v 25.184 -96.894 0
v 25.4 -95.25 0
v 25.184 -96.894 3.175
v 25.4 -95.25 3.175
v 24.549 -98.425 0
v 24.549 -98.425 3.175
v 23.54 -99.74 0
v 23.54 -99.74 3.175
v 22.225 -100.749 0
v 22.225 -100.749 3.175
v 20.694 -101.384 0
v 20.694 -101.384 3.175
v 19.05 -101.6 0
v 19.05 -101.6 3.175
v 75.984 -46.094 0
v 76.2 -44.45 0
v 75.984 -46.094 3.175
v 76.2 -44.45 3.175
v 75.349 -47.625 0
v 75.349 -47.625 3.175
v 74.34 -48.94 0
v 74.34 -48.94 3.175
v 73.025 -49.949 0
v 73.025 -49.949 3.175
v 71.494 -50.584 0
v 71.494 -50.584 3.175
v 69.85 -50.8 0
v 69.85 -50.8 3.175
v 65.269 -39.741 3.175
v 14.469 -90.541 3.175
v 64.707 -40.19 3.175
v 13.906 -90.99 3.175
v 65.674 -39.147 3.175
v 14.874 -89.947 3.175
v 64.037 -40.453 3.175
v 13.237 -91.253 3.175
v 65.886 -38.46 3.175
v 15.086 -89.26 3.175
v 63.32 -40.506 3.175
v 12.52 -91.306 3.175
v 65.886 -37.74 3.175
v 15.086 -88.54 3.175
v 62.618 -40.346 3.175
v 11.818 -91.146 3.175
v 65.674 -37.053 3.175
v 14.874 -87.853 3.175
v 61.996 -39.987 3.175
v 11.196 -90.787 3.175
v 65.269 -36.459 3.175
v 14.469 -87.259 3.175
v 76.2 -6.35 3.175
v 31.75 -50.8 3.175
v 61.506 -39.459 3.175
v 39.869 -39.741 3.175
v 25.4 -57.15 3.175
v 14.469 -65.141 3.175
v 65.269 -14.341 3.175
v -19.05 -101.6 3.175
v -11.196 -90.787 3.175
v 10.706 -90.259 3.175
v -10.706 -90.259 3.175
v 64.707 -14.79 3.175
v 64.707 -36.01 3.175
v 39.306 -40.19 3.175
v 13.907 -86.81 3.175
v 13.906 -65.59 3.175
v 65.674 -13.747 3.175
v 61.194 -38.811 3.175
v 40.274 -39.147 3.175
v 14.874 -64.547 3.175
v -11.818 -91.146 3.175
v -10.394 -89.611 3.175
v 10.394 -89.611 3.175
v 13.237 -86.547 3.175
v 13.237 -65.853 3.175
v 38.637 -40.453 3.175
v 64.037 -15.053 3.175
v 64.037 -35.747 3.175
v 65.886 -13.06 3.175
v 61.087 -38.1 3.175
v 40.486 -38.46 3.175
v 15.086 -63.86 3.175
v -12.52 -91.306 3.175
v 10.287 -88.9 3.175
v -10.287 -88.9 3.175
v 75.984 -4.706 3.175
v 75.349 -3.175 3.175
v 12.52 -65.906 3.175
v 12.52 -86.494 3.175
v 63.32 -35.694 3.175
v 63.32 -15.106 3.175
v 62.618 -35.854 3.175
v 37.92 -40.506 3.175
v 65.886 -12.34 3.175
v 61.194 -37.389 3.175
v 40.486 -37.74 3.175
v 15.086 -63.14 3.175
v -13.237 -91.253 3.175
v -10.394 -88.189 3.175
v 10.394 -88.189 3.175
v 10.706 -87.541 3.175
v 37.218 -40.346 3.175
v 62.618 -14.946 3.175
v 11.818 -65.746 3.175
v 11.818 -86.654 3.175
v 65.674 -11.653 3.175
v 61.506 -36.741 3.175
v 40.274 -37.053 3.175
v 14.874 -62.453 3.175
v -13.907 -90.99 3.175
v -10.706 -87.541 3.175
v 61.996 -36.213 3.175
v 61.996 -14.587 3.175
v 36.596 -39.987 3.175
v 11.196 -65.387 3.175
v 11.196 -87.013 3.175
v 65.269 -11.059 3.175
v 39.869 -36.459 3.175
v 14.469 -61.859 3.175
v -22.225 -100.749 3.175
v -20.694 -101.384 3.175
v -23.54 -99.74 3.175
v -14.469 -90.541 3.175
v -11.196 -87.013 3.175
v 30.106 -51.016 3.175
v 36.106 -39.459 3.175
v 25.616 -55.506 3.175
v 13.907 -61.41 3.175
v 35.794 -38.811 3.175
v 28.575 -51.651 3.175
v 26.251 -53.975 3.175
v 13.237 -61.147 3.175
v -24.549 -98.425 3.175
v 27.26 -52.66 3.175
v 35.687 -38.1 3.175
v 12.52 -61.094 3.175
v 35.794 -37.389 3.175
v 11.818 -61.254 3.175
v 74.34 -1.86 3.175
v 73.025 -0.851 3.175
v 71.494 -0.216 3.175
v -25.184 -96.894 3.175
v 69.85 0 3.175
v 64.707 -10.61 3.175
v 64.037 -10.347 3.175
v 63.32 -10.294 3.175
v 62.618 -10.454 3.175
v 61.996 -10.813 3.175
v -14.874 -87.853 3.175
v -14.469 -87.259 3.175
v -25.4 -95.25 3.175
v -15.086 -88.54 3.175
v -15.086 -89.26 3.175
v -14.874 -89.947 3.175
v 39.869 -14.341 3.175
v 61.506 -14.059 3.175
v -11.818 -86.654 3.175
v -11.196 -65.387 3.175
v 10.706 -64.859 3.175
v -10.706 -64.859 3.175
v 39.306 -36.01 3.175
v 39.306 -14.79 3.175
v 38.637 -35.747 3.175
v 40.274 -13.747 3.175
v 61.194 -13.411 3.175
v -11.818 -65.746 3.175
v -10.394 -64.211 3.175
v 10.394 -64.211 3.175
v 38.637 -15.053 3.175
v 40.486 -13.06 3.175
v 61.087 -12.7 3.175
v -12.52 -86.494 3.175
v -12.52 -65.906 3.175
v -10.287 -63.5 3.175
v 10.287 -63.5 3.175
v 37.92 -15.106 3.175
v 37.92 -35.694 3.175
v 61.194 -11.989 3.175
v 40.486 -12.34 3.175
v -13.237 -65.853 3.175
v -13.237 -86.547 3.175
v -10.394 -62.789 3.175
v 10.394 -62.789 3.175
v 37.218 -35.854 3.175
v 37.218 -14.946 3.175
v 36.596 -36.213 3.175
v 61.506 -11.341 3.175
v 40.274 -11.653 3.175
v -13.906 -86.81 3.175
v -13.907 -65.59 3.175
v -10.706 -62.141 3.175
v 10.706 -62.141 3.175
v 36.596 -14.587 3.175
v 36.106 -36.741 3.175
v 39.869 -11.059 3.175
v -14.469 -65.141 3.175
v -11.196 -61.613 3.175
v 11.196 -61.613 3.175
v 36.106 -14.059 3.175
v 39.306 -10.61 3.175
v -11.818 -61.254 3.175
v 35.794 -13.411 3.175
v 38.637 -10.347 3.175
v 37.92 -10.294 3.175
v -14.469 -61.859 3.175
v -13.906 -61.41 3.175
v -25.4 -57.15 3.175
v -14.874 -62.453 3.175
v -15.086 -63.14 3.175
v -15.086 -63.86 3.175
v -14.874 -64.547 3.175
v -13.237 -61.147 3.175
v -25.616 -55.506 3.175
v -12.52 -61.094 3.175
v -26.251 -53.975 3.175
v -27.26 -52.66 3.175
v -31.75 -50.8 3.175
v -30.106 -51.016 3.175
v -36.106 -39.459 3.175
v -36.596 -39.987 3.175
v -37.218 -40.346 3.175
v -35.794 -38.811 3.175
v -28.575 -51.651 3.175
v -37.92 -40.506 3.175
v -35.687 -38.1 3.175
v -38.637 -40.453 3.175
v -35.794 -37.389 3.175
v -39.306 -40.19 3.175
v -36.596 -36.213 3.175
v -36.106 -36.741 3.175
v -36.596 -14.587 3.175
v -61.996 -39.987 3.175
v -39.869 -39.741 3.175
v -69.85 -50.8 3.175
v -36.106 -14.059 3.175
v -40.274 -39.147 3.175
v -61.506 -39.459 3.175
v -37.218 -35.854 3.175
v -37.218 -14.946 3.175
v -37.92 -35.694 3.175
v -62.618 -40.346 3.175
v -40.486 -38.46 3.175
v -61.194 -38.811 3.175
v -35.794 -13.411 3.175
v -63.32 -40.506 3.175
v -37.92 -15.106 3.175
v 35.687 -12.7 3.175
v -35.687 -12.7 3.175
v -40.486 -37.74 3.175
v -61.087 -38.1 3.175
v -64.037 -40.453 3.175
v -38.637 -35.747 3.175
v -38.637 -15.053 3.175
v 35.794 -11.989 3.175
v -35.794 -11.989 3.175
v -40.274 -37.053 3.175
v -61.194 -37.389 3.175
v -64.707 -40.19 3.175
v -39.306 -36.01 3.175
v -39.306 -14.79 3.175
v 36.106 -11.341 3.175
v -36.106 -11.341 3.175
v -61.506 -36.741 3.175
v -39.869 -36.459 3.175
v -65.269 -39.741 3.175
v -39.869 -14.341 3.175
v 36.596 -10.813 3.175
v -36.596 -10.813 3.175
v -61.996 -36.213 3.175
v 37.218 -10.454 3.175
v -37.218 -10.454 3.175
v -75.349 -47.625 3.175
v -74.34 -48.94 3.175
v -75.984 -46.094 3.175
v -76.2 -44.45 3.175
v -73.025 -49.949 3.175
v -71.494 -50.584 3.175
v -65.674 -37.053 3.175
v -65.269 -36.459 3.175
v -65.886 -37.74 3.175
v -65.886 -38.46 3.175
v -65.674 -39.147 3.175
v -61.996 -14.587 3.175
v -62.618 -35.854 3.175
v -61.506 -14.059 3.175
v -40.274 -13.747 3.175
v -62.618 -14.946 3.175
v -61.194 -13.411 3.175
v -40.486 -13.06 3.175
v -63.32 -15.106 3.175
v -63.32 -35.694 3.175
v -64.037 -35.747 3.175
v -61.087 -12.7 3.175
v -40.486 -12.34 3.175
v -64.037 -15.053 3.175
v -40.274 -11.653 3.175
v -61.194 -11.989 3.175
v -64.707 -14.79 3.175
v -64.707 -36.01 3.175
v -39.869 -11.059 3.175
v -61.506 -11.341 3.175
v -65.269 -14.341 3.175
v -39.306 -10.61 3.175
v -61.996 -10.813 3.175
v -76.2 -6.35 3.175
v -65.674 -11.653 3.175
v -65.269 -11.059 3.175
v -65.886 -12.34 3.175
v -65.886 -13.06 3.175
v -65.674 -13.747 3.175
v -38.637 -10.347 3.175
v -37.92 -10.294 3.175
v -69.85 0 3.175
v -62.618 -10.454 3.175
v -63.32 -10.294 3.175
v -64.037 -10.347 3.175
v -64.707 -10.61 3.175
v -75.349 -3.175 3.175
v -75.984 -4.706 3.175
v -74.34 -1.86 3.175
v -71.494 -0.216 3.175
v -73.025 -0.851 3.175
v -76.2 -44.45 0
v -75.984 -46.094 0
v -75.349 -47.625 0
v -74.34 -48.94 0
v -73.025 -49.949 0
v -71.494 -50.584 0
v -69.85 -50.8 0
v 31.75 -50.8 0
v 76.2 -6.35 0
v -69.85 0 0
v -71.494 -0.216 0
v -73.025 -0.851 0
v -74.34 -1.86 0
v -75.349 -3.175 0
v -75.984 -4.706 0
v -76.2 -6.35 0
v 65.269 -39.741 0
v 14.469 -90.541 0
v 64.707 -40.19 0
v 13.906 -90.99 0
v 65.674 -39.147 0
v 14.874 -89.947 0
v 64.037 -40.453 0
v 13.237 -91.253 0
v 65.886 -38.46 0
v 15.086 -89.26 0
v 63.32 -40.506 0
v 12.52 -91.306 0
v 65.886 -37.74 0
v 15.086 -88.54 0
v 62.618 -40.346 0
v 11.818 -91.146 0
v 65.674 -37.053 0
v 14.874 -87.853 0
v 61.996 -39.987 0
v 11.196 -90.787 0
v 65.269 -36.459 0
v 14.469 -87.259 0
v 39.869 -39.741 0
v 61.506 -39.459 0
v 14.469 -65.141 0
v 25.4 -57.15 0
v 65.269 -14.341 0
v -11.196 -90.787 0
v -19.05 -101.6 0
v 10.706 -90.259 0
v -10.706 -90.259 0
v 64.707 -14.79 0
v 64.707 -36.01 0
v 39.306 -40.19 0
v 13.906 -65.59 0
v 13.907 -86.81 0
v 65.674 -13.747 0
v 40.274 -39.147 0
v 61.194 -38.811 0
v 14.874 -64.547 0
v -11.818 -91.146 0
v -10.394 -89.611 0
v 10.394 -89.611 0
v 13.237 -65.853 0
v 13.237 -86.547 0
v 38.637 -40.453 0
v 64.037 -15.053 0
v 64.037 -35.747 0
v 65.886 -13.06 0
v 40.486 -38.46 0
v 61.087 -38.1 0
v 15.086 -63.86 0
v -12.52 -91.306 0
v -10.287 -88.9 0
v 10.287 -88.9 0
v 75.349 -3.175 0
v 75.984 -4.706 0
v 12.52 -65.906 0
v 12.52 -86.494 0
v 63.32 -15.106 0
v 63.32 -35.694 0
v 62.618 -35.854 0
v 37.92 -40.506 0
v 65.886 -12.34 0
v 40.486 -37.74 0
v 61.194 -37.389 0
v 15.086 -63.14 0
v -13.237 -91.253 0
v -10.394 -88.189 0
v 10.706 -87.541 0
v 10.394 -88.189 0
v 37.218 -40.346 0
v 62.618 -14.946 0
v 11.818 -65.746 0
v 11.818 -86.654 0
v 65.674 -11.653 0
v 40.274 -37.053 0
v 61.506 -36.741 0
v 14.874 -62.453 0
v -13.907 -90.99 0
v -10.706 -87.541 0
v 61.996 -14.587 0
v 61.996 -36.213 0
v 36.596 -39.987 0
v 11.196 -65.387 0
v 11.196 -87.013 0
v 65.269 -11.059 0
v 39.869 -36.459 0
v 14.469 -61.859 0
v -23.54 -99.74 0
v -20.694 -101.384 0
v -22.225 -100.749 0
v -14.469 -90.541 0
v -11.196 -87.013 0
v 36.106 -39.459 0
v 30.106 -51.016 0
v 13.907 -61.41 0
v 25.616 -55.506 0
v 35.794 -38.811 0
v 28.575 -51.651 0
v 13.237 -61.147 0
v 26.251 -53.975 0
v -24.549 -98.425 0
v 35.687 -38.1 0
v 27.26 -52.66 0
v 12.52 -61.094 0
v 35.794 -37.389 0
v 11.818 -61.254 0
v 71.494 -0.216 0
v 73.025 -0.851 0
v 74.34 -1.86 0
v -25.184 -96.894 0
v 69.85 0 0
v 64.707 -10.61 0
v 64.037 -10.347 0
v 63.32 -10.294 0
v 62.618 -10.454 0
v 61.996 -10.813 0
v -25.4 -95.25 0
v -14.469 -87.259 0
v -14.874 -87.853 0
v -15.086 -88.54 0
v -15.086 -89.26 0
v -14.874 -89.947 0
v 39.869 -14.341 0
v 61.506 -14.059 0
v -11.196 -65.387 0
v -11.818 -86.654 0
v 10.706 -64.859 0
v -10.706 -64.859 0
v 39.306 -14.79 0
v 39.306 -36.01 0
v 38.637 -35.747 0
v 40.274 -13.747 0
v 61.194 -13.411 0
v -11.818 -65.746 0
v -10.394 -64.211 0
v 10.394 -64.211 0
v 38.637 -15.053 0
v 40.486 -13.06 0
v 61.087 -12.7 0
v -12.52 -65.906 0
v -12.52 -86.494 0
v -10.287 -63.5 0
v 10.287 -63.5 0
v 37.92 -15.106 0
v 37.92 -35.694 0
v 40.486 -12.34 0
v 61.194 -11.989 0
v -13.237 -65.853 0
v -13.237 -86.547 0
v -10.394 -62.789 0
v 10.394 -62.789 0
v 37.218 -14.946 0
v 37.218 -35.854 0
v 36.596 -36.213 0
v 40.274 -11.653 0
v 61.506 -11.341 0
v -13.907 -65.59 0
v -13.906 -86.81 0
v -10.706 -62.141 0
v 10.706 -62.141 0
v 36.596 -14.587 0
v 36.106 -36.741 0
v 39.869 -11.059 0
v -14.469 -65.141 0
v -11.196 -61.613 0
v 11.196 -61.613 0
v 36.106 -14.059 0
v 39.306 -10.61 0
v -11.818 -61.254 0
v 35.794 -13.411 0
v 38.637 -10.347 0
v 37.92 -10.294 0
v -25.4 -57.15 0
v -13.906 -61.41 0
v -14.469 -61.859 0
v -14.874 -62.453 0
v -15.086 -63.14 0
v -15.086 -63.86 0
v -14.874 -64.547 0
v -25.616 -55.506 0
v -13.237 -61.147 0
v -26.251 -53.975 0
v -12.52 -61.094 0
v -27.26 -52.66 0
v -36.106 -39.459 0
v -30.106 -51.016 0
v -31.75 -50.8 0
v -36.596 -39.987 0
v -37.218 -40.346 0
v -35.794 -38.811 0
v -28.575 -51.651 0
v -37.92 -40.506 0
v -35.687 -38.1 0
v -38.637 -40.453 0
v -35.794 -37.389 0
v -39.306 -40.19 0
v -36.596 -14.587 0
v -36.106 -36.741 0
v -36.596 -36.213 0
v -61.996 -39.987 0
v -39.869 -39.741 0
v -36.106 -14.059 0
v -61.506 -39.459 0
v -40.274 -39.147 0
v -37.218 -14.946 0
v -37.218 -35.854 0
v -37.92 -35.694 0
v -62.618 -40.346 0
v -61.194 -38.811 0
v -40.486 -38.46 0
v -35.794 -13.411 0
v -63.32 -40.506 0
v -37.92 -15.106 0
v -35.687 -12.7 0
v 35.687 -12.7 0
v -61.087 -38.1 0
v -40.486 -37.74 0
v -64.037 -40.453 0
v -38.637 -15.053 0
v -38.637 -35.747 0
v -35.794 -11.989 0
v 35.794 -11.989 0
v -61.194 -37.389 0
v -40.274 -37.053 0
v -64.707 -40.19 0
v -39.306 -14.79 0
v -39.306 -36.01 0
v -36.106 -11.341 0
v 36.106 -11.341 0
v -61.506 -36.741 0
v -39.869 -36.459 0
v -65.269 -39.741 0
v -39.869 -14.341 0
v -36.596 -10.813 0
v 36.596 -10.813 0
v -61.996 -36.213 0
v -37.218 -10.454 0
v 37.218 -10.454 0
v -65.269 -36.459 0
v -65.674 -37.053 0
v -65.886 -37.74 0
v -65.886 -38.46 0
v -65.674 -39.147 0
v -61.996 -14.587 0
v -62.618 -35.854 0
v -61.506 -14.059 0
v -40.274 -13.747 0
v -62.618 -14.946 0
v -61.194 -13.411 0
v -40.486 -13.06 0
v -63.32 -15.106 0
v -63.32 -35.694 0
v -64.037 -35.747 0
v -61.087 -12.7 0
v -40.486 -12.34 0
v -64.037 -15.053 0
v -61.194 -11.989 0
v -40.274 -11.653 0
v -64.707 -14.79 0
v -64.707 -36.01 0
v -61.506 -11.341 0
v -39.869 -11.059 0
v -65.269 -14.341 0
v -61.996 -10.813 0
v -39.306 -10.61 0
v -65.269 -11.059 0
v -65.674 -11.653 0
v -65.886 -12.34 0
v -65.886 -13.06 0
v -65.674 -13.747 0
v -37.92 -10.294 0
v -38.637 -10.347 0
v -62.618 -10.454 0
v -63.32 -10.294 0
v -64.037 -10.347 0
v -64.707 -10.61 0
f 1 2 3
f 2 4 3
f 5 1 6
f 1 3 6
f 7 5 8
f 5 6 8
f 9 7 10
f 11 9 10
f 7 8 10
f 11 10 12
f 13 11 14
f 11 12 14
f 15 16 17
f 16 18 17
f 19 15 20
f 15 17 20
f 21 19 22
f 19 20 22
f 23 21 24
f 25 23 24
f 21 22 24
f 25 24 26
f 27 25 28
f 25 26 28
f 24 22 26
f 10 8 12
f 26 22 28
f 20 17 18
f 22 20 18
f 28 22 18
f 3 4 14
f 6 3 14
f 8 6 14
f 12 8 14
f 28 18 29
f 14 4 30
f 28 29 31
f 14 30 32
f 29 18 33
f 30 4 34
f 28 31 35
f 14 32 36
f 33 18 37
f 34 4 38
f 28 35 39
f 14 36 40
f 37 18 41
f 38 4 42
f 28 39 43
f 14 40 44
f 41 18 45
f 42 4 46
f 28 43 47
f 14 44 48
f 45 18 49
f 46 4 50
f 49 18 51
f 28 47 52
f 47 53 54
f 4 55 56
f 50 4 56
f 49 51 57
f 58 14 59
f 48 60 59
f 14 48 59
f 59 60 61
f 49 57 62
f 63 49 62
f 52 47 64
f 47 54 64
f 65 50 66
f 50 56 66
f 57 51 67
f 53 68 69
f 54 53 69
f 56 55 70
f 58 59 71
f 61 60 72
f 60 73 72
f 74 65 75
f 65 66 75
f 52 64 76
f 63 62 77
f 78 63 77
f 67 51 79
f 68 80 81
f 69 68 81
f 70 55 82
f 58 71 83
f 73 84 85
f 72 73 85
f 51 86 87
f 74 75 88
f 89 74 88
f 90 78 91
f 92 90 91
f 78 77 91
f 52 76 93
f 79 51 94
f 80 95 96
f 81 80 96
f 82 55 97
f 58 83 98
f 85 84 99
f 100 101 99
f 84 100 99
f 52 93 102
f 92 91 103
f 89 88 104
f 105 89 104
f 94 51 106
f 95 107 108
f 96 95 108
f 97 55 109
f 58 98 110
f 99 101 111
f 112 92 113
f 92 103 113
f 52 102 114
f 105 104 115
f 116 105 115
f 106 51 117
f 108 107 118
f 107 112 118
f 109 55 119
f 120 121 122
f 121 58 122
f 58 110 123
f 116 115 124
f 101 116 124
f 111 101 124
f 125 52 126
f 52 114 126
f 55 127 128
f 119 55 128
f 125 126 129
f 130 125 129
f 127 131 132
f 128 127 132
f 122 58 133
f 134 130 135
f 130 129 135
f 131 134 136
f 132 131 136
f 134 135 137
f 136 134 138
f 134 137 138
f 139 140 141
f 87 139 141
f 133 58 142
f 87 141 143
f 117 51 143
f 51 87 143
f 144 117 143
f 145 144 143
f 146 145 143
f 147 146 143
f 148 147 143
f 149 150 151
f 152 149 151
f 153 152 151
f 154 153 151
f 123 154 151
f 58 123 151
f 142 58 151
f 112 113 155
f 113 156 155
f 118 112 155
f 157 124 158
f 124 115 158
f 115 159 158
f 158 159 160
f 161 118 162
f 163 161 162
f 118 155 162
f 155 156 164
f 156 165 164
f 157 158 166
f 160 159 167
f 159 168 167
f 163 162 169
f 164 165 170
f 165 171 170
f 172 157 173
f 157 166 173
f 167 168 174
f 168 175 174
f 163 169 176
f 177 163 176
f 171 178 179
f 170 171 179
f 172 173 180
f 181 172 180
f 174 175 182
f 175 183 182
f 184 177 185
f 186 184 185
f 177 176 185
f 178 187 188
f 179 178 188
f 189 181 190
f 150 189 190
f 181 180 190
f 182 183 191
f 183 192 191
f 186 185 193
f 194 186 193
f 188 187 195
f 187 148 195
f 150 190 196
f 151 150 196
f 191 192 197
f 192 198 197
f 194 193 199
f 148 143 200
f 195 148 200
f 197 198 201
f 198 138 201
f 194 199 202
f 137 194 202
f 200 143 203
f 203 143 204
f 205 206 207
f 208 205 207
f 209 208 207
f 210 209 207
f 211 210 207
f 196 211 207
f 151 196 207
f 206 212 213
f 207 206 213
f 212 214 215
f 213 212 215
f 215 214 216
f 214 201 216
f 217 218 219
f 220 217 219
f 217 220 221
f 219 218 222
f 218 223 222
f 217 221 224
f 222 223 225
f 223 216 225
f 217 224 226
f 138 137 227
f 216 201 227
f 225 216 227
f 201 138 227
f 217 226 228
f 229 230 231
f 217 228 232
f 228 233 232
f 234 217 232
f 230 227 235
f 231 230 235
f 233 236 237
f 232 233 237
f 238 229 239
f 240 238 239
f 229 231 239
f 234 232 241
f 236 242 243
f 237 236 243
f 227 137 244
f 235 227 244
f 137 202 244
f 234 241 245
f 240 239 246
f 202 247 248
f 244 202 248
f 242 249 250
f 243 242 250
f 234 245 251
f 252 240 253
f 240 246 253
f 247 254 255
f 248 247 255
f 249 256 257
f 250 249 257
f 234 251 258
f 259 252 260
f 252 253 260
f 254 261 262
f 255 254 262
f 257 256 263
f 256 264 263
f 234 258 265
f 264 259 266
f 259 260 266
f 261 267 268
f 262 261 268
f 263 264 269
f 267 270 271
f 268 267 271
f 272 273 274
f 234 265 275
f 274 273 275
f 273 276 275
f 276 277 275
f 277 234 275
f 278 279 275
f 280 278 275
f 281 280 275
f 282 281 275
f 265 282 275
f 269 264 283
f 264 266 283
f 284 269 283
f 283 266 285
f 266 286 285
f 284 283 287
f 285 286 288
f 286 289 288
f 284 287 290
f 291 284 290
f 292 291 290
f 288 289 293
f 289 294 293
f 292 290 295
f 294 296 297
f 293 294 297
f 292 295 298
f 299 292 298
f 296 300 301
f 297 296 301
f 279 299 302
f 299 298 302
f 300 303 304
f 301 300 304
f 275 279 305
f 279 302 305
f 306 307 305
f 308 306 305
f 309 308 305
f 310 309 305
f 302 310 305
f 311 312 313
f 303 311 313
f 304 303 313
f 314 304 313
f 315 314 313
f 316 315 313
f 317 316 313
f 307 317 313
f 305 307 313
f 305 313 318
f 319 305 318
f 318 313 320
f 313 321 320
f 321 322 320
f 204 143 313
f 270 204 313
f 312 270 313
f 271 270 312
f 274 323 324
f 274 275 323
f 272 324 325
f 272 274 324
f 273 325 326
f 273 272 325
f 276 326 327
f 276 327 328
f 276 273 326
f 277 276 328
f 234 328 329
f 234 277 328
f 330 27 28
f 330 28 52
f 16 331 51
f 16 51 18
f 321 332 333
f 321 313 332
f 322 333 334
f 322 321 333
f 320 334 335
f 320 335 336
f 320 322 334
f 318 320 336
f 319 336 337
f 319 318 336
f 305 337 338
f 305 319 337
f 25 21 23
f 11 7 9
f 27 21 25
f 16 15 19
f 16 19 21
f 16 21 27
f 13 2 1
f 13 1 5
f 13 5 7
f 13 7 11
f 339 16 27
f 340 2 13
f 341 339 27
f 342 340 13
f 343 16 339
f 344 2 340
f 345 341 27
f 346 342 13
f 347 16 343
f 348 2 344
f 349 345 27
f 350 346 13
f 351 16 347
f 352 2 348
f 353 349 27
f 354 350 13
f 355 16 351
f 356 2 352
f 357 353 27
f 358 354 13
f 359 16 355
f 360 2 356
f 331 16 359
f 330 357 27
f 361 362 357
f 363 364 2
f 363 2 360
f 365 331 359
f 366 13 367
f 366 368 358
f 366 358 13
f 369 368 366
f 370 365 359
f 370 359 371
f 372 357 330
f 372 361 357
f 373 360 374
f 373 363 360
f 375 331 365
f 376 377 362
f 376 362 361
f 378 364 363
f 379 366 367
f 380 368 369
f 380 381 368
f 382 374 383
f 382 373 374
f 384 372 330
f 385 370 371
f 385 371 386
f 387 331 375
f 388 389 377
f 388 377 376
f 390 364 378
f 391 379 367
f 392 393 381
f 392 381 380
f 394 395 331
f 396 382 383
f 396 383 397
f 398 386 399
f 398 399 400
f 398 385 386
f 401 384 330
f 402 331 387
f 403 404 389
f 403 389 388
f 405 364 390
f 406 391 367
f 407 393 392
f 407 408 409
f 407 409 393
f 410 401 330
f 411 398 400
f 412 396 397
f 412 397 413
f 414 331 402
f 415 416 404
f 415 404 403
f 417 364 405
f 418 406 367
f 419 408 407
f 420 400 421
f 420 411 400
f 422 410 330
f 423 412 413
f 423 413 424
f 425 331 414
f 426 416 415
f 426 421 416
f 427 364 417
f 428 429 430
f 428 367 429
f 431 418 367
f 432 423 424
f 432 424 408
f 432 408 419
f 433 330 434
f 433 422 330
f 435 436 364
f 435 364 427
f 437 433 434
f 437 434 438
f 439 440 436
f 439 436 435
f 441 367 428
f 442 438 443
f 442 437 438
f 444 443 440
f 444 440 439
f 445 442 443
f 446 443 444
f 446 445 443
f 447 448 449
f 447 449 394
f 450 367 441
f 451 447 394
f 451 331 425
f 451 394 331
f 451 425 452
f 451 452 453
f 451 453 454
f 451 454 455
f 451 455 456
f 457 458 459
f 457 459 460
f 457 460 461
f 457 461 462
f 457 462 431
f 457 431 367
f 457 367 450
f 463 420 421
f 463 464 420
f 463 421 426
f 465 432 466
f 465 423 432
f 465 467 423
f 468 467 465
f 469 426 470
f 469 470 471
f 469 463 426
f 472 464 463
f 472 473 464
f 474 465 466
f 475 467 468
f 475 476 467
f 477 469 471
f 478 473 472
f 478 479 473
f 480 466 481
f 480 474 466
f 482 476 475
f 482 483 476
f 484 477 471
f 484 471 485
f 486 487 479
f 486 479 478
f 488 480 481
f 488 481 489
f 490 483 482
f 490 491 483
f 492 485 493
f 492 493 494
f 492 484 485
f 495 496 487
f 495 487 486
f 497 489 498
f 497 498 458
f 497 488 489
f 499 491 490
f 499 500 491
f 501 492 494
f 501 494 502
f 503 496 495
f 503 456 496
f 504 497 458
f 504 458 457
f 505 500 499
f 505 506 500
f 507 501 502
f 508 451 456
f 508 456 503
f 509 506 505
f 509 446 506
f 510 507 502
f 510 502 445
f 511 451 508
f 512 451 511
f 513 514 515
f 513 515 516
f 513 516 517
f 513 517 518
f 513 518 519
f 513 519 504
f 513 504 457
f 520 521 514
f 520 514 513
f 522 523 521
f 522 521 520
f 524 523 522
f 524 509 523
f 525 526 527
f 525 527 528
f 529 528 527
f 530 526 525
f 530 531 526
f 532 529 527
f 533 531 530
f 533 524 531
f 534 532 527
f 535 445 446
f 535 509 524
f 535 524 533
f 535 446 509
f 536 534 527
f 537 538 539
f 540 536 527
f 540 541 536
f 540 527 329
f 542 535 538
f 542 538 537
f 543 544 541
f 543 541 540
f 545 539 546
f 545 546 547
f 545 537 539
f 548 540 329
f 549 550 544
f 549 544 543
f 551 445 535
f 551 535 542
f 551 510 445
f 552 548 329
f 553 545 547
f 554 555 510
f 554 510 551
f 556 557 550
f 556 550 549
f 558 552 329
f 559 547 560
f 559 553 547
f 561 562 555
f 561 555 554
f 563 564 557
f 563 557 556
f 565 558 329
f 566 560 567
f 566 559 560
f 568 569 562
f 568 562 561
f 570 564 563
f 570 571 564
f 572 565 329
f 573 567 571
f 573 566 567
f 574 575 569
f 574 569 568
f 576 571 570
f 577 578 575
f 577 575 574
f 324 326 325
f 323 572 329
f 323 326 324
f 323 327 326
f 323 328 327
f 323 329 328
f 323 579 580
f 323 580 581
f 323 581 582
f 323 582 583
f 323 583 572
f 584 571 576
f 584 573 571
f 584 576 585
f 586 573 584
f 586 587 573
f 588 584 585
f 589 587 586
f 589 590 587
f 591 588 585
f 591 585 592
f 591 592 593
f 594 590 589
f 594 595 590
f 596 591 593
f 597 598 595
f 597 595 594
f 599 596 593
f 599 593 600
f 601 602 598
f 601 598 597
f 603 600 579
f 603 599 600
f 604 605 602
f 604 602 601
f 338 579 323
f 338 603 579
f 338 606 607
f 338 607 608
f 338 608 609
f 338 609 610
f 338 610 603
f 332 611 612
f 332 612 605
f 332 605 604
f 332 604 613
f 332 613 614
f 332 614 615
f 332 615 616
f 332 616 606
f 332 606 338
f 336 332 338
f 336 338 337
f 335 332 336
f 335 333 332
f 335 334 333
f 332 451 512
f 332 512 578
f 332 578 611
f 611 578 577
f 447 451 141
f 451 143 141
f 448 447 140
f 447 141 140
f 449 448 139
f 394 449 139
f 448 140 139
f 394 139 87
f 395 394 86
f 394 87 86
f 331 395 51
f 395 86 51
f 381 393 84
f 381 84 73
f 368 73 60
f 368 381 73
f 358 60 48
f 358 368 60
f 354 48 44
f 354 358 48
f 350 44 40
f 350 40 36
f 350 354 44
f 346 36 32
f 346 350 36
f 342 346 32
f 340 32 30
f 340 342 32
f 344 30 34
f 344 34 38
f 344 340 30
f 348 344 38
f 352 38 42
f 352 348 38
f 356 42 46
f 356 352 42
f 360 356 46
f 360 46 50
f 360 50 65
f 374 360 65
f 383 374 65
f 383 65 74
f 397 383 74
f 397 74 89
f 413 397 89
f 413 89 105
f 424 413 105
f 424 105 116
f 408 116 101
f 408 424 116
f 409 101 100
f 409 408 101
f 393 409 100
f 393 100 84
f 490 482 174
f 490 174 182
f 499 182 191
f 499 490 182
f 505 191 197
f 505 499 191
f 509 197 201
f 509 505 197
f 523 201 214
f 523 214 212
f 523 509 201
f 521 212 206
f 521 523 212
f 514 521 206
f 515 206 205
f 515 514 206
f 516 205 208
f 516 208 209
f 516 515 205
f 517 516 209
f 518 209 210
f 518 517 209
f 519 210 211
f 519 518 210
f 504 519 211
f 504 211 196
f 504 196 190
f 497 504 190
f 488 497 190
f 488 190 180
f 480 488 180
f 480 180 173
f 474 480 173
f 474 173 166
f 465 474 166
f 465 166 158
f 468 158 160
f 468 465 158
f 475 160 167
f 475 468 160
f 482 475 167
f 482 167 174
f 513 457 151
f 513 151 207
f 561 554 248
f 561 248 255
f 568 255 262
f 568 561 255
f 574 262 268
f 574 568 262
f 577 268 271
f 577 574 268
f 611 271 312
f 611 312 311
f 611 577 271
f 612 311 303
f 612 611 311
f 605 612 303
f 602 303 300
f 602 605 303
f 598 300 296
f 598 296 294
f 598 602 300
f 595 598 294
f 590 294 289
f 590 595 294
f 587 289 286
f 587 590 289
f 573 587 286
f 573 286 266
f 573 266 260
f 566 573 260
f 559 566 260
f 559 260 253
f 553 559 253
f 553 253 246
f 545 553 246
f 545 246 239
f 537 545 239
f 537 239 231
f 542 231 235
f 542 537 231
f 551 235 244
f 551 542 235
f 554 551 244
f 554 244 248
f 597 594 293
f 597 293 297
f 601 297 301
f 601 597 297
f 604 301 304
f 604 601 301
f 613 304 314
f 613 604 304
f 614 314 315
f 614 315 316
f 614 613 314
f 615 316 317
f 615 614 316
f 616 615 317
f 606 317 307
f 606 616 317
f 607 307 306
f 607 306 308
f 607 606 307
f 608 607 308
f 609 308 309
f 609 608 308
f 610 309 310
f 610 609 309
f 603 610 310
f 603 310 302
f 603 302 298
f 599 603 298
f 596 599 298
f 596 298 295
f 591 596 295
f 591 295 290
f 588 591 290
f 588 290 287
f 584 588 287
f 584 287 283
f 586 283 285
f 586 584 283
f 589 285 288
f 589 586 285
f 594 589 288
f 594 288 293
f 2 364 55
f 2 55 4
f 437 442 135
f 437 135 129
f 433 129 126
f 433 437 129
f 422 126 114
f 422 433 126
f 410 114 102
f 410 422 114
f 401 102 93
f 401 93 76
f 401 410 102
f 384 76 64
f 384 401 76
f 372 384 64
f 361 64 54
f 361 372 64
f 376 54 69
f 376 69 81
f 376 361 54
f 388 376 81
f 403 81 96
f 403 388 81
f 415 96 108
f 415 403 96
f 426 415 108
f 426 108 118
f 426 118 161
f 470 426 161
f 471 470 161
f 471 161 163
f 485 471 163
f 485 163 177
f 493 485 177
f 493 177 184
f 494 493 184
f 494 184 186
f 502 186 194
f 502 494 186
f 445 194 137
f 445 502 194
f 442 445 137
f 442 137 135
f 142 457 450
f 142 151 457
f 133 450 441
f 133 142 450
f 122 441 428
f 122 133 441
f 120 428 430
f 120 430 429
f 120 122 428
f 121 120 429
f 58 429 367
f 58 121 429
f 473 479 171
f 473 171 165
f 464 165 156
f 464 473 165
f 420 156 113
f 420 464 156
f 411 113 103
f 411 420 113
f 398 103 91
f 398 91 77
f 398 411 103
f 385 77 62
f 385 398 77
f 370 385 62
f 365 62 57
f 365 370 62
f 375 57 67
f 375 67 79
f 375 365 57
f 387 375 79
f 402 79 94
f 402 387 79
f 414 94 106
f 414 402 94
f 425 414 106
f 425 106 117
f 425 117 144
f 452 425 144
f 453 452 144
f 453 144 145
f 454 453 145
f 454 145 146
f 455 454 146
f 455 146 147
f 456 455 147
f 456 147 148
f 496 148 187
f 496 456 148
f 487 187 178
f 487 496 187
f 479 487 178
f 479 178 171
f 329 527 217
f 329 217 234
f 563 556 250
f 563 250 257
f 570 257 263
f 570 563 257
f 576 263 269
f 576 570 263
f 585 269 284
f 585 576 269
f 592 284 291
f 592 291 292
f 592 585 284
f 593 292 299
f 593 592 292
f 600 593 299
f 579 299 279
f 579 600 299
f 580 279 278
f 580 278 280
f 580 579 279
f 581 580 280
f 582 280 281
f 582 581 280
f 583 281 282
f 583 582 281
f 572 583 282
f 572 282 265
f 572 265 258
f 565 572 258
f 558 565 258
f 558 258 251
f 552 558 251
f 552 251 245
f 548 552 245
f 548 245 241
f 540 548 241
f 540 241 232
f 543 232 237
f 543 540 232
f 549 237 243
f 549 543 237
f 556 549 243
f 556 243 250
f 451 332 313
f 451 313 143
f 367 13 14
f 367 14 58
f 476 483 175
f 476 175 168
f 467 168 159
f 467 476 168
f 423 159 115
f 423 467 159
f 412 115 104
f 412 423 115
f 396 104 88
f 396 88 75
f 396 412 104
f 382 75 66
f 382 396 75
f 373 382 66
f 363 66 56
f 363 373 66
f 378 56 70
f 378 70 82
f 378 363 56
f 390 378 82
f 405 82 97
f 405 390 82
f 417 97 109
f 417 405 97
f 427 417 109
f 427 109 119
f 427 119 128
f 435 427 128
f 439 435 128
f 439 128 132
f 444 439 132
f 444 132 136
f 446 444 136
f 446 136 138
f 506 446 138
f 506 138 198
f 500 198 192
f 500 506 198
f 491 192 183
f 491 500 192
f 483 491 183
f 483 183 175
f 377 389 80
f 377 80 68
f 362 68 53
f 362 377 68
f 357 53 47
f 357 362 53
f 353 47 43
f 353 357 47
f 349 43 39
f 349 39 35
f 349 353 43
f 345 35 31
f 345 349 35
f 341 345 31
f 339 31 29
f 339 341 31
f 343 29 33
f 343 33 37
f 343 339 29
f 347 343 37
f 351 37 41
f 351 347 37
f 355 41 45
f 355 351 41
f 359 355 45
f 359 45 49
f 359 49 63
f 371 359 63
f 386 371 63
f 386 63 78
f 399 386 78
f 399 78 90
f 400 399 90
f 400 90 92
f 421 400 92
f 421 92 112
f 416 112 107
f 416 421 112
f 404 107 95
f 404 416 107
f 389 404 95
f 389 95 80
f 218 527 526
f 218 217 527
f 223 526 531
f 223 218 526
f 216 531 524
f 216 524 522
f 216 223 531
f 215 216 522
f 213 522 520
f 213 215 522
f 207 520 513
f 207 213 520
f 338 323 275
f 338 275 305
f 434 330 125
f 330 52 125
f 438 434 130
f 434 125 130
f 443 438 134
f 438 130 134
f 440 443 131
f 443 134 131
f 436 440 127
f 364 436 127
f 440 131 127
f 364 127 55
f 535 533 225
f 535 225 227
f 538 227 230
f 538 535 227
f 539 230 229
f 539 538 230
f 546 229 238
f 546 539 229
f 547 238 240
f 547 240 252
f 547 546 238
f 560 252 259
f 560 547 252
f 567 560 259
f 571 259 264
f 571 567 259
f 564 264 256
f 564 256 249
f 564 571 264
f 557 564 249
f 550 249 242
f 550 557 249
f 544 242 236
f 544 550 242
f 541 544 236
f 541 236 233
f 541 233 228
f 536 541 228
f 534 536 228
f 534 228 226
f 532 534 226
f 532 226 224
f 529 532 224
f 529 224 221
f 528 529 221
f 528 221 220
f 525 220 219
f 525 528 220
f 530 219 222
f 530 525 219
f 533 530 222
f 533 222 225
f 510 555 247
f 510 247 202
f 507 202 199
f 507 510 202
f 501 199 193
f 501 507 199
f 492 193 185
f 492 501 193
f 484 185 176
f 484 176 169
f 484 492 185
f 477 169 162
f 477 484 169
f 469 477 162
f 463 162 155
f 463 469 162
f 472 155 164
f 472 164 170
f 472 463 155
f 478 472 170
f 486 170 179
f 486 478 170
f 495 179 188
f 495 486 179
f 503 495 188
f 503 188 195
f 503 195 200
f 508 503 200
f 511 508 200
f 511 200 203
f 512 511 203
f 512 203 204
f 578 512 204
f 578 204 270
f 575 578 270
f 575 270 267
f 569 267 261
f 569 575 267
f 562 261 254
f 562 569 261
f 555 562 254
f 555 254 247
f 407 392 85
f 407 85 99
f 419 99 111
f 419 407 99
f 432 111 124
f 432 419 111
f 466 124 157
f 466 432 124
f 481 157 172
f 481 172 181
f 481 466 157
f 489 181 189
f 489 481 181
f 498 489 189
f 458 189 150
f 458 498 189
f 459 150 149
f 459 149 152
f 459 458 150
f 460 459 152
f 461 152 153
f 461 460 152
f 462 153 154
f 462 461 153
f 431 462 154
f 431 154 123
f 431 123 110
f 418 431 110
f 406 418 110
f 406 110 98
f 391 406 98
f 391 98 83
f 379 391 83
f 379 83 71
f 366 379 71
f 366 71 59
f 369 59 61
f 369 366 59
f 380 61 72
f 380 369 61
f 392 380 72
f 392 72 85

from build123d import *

# Parameters (mm, degrees)
SKETCH1_R           = 2.413
BOSS_EXTRUDE1_DEPTH = 3.175
FILLET1_R           = 6.35


with BuildPart() as part:
    # Sketch1 → Boss-Extrude1 (new body)
    with BuildSketch(Plane.XY):
        Polygon((-76.2, 0), (76.2, 0), (76.2, -50.8), (25.4, -50.8), (25.4, -101.6), (-25.4, -101.6), (-25.4, -50.8), (-76.2, -50.8), align=None)
        with Locations((-63.5, -12.7)):
            Circle(SKETCH1_R, mode=Mode.SUBTRACT)
        with Locations((-63.5, -38.1)):
            Circle(SKETCH1_R, mode=Mode.SUBTRACT)
        with Locations((-38.1, -12.7)):
            Circle(SKETCH1_R, mode=Mode.SUBTRACT)
        with Locations((-38.1, -38.1)):
            Circle(SKETCH1_R, mode=Mode.SUBTRACT)
        with Locations((-12.7, -88.9)):
            Circle(SKETCH1_R, mode=Mode.SUBTRACT)
        with Locations((-12.7, -63.5)):
            Circle(SKETCH1_R, mode=Mode.SUBTRACT)
        with Locations(Location((12.7, -88.9, 0), (0, 0, 180))):
            Circle(SKETCH1_R, mode=Mode.SUBTRACT)
        with Locations(Location((12.7, -63.5, 0), (0, 0, 180))):
            Circle(SKETCH1_R, mode=Mode.SUBTRACT)
        with Locations(Location((63.5, -38.1, 0), (0, 0, 180))):
            Circle(SKETCH1_R, mode=Mode.SUBTRACT)
        with Locations(Location((38.1, -38.1, 0), (0, 0, 180))):
            Circle(SKETCH1_R, mode=Mode.SUBTRACT)
        with Locations(Location((38.1, -12.7, 0), (0, 0, 180))):
            Circle(SKETCH1_R, mode=Mode.SUBTRACT)
        with Locations(Location((63.5, -12.7, 0), (0, 0, 180))):
            Circle(SKETCH1_R, mode=Mode.SUBTRACT)
    extrude(amount=BOSS_EXTRUDE1_DEPTH)

    # Fillet1
    fillet1_edges = [part.edges().sort_by_distance(p)[0] for p in [
        (25.4, -101.6, 1.5875),
        (-25.4, -101.6, 1.5875),
        (-25.4, -50.8, 1.5875),
        (-76.2, -50.8, 1.5875),
        (-76.2, 0, 1.5875),
        (76.2, 0, 1.5875),
        (76.2, -50.8, 1.5875),
        (25.4, -50.8, 1.5875),
    ]]
    fillet(fillet1_edges, radius=FILLET1_R)


solid = part.part
